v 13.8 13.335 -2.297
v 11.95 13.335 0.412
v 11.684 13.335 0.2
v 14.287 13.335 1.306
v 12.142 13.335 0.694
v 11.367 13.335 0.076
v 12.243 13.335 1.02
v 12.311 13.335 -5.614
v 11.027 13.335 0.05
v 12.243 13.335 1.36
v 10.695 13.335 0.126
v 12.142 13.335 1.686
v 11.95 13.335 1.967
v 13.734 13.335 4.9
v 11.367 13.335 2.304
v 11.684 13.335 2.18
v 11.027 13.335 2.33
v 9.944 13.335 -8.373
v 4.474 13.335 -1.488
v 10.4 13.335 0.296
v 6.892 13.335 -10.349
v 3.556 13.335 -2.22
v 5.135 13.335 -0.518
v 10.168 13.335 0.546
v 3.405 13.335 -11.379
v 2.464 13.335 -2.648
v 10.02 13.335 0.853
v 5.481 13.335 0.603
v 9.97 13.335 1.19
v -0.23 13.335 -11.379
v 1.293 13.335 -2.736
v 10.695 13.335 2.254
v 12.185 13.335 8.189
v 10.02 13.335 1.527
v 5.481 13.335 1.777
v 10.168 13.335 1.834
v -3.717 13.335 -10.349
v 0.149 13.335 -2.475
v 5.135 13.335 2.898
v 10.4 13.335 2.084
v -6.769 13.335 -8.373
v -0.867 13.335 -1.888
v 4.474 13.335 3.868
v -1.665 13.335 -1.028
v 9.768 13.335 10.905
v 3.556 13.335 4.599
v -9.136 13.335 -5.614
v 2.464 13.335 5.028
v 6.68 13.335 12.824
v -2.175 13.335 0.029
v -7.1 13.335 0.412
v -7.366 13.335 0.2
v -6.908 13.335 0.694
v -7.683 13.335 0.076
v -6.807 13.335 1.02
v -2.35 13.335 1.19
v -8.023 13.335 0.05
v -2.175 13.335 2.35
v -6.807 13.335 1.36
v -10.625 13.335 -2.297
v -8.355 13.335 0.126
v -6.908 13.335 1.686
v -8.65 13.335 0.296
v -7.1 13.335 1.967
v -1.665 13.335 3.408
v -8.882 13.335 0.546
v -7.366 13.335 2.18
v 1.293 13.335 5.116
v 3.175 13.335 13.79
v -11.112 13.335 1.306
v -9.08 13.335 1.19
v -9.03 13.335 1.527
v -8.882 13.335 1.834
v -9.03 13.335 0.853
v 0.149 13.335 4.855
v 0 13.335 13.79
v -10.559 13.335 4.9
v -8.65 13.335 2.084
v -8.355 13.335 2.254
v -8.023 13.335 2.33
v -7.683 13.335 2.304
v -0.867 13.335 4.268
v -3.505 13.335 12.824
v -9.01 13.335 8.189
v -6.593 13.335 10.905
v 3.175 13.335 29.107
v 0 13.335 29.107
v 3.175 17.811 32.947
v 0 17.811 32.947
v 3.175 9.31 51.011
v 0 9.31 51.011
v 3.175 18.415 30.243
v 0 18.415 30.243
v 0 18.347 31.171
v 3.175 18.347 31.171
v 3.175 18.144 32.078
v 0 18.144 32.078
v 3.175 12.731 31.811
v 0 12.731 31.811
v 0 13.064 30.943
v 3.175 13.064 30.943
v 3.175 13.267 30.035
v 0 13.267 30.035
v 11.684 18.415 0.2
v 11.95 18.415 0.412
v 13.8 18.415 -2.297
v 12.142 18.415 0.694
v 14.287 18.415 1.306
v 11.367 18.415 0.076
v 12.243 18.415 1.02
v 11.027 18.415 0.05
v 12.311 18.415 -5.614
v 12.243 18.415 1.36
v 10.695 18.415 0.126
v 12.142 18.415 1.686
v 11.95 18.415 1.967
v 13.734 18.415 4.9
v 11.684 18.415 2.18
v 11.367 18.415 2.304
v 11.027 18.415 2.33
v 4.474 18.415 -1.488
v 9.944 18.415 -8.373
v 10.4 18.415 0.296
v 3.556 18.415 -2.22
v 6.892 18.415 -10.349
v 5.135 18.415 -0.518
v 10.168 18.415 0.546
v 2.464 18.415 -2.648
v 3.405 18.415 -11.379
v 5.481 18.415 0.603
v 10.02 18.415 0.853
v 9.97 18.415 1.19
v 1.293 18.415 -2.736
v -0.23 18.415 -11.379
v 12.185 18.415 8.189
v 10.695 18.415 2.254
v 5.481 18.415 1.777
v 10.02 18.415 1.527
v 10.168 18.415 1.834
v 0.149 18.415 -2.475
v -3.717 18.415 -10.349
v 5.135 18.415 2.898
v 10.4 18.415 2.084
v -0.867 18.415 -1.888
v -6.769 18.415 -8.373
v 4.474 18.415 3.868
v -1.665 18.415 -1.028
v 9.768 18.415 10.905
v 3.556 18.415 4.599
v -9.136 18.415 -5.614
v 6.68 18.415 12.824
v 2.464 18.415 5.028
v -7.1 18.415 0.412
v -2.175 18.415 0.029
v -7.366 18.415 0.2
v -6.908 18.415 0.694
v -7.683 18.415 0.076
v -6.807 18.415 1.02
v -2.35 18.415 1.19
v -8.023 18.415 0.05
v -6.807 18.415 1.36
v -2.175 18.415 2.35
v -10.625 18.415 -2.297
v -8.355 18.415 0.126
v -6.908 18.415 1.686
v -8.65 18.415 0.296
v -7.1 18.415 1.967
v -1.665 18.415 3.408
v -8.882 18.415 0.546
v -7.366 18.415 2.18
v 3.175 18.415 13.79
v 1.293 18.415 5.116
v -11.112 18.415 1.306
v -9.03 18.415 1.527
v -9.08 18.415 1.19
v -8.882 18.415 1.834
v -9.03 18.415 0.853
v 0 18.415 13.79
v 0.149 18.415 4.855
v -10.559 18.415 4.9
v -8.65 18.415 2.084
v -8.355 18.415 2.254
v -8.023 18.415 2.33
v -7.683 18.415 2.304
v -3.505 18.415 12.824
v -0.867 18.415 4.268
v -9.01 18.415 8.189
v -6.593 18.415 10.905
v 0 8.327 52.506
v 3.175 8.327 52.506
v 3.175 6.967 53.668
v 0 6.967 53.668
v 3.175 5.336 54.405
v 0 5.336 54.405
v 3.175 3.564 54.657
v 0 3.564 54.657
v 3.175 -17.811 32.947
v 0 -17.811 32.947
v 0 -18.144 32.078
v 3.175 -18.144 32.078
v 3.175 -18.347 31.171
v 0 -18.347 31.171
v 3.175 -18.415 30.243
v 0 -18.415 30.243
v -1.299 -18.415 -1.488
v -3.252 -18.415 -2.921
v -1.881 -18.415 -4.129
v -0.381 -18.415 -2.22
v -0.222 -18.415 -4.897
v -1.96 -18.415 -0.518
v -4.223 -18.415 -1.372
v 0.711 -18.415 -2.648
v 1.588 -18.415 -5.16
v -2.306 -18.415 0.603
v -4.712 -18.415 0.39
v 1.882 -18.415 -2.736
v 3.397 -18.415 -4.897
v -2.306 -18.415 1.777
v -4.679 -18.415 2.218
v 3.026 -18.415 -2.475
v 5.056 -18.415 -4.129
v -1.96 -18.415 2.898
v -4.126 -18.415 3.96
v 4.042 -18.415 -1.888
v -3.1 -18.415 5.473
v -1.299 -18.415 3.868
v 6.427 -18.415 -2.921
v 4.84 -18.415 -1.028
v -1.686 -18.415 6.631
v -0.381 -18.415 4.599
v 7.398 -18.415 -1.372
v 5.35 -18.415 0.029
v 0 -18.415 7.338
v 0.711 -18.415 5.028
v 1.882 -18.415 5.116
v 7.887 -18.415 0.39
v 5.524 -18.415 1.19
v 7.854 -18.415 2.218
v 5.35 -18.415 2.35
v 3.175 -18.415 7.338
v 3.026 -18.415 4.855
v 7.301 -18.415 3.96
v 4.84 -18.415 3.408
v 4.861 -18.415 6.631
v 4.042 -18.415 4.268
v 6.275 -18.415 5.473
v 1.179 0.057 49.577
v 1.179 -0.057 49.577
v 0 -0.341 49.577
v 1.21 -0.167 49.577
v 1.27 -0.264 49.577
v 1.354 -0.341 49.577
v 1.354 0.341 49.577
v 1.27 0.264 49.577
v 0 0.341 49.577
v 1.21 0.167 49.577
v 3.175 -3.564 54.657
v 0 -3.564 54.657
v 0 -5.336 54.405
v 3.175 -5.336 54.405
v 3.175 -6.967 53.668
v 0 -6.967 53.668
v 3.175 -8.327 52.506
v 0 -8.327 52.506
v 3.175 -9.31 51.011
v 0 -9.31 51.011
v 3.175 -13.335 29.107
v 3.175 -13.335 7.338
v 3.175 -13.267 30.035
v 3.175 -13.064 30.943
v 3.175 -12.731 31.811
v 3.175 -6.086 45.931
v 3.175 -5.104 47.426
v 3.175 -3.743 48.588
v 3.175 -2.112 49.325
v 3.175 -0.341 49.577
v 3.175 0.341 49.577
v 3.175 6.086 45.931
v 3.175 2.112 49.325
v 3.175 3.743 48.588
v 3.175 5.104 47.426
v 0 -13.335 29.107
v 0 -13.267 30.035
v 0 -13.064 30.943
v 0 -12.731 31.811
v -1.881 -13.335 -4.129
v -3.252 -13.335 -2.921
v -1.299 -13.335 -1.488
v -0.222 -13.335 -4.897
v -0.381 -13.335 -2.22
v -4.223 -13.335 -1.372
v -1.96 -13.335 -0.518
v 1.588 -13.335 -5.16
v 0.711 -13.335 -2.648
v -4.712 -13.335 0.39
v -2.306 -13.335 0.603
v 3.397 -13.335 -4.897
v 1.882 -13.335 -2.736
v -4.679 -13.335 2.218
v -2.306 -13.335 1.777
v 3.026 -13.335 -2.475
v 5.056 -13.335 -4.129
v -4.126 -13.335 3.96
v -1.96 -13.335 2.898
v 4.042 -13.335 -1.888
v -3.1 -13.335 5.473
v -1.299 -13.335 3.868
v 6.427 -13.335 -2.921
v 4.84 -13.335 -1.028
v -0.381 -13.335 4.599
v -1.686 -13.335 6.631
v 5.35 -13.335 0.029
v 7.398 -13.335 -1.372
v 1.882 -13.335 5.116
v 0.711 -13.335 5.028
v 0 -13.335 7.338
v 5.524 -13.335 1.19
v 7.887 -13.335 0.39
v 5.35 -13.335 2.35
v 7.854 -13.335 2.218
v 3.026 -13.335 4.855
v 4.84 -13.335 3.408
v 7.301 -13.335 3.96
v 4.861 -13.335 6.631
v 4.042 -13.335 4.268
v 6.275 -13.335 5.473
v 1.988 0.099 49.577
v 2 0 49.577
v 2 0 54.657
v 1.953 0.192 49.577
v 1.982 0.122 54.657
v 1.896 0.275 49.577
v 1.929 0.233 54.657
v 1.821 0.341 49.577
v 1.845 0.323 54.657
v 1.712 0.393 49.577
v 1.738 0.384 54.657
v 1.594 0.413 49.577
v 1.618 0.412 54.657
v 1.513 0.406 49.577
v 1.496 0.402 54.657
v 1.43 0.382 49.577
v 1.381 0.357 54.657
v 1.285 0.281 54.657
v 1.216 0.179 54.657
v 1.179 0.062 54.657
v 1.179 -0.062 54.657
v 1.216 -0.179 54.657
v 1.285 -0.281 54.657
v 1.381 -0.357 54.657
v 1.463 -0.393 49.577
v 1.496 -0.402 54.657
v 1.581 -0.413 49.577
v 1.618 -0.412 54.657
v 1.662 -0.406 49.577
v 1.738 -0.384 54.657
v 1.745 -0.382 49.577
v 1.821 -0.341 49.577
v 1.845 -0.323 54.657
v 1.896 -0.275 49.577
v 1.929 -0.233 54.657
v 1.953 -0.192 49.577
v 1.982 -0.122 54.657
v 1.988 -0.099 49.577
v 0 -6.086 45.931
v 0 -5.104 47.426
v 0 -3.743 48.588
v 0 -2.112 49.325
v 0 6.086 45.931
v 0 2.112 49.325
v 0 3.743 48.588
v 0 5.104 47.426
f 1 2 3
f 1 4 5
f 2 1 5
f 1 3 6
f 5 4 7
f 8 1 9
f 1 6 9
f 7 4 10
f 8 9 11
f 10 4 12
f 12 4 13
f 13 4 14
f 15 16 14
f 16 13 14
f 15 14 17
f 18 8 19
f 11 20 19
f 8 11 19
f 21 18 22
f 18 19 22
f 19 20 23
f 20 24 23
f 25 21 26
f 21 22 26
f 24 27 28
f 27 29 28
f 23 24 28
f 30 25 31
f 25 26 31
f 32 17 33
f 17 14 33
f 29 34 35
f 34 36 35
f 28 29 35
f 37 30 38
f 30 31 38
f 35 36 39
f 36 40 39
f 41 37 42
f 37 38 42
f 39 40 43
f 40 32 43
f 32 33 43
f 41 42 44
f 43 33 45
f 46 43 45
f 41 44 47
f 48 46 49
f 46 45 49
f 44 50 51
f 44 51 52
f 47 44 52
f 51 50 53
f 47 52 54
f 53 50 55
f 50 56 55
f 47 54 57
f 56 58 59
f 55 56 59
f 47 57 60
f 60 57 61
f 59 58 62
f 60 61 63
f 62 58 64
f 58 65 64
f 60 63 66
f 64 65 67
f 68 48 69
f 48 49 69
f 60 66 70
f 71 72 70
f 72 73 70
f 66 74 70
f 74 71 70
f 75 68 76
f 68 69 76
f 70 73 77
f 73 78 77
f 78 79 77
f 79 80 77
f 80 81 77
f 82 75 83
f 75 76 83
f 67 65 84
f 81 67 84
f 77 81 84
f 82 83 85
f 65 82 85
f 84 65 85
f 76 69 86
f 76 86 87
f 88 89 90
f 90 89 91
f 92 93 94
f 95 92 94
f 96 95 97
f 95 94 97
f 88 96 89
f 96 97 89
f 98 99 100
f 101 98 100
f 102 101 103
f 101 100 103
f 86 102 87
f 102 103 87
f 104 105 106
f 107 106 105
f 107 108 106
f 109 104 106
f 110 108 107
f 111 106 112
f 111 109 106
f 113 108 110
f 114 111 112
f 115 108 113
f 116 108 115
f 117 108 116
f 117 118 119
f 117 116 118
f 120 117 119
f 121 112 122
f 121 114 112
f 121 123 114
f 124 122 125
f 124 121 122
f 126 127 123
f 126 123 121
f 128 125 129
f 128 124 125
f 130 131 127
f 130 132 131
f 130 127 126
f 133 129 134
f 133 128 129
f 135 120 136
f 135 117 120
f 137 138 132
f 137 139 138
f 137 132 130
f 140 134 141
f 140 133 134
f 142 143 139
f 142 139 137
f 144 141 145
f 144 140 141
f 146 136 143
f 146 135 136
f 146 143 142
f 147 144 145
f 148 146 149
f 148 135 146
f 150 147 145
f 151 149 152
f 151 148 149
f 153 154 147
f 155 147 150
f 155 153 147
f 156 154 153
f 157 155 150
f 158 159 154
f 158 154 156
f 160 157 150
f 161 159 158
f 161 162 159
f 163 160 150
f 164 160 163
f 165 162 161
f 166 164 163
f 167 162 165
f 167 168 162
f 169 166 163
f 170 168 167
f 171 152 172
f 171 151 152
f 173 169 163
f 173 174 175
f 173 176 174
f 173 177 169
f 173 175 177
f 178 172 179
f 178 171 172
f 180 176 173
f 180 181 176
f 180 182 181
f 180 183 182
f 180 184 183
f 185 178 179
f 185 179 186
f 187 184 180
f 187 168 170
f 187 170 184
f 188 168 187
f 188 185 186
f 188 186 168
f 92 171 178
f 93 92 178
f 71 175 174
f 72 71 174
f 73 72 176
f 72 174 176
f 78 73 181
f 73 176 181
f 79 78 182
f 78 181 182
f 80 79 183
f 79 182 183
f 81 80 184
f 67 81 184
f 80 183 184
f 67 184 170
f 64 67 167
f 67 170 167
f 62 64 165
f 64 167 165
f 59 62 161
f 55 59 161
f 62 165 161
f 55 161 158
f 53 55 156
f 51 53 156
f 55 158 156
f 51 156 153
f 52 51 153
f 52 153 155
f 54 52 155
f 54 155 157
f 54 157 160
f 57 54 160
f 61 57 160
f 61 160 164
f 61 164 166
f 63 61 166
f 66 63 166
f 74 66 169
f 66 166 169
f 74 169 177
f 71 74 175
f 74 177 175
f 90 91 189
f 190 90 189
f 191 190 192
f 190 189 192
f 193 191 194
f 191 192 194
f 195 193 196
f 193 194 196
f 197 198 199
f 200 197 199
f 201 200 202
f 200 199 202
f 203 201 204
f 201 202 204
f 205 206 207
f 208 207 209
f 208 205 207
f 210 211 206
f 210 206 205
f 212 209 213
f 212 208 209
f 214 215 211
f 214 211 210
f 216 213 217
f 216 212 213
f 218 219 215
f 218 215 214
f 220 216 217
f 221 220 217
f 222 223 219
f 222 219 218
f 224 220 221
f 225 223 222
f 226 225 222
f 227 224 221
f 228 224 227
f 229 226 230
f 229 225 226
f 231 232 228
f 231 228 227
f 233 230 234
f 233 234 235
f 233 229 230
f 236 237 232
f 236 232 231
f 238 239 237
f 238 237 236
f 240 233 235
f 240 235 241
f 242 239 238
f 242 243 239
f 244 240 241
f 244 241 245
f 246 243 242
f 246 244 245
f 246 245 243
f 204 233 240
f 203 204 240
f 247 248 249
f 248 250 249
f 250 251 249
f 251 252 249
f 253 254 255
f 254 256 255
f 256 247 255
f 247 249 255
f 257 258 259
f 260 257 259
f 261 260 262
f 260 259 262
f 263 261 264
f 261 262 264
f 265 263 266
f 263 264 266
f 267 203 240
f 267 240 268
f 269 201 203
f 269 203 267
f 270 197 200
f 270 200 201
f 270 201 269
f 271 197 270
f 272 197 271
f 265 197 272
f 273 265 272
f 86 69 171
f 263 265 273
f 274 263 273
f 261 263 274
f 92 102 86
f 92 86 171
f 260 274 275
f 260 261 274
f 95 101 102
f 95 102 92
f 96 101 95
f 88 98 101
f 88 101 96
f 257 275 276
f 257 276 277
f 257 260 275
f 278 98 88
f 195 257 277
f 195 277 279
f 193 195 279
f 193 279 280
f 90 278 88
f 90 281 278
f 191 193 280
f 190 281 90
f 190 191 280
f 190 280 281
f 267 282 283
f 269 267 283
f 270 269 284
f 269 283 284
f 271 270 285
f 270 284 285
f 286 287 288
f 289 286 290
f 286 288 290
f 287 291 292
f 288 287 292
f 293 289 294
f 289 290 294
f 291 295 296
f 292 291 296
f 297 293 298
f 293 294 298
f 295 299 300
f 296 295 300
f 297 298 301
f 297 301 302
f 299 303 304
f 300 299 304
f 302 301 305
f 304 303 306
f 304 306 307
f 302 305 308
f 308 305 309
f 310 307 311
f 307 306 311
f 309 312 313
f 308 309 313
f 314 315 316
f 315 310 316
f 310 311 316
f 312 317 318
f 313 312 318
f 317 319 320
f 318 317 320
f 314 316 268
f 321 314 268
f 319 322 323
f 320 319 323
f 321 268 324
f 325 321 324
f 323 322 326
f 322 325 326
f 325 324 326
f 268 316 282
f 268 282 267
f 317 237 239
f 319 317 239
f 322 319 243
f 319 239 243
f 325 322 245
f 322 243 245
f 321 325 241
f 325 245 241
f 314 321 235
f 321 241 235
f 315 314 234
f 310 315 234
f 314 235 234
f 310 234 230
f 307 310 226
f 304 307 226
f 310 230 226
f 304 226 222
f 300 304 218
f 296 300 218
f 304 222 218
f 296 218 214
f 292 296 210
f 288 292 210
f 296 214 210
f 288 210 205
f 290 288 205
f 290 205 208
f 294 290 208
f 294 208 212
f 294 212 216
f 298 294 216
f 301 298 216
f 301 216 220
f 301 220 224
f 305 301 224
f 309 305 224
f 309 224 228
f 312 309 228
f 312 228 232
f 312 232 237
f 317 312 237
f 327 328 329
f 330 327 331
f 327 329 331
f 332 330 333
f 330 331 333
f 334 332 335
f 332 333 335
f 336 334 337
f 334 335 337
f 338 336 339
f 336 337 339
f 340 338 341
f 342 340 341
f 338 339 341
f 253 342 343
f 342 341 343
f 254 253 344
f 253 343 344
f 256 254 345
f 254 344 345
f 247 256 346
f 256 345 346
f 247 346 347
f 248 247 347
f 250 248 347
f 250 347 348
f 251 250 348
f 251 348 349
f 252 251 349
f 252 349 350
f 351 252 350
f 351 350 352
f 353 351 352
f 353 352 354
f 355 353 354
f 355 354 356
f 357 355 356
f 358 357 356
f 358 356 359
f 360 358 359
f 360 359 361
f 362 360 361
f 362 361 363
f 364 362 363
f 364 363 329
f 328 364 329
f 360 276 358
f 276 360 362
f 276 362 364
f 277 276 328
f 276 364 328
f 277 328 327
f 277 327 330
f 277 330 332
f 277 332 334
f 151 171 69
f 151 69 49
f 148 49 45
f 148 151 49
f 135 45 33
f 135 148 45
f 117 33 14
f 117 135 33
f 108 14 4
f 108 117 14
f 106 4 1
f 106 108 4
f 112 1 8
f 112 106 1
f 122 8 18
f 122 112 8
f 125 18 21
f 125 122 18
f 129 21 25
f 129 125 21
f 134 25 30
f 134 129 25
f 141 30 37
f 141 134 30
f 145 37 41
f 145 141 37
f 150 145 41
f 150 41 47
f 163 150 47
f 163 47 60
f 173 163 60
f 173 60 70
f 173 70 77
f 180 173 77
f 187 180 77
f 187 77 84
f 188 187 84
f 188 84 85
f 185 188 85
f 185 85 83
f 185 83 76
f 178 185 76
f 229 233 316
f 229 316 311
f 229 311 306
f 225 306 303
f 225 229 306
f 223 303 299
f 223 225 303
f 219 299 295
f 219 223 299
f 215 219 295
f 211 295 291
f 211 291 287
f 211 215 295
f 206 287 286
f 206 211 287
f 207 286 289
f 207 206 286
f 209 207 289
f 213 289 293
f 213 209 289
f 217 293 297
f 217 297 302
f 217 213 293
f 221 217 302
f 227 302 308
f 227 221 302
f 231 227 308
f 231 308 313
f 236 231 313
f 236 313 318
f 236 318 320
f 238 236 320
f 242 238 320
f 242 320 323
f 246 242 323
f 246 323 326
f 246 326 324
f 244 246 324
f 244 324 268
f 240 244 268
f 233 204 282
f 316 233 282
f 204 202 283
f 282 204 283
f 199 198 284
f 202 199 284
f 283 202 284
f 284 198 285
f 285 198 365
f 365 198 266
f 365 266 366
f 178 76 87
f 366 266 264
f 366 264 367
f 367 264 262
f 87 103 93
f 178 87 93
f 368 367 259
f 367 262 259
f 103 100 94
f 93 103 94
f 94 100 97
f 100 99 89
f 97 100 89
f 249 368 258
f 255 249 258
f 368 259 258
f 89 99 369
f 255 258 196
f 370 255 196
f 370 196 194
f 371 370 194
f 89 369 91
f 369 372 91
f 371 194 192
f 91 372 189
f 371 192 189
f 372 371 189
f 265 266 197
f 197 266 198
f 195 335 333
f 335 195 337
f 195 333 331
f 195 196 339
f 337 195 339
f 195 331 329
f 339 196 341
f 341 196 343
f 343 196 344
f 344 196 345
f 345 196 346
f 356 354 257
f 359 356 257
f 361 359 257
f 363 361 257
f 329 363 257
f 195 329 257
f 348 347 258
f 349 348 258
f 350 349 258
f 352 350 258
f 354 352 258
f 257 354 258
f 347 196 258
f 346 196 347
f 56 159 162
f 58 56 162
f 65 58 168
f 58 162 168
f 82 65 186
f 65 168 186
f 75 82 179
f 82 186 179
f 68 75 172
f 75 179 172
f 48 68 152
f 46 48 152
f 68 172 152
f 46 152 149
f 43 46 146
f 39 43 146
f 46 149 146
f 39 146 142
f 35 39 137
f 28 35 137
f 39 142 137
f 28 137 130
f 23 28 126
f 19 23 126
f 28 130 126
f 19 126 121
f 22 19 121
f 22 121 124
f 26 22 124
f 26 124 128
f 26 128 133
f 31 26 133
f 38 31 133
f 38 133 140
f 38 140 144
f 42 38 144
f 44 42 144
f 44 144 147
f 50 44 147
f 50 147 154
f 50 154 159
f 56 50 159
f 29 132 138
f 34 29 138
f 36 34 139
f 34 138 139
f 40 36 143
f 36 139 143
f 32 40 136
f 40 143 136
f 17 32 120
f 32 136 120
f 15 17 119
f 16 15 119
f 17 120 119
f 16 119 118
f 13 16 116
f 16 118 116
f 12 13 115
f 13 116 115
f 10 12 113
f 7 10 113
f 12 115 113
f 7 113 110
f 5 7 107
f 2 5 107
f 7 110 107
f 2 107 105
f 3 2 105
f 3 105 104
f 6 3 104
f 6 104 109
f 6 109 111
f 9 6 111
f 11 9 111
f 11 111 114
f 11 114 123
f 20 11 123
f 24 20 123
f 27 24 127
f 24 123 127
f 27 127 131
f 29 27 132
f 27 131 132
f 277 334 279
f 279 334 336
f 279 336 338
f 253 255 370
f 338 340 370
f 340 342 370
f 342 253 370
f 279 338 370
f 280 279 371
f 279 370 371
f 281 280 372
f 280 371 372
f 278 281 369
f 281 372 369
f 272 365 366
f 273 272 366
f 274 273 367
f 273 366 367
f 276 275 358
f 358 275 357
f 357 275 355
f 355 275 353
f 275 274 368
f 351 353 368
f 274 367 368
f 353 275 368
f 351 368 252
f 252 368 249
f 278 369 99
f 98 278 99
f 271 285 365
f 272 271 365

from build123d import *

# Parameters (mm, degrees)
F1_DEPTH = 3.175
F2_R     = 6.35
F2_R_2   = 3.937
F3_DEPTH = 5.08
F4_R     = 12.7
F4_R_2   = 1.143
F4_R_3   = 3.937
F5_DEPTH = 5.08
F6_R     = 0.41275
F7_DEPTH = 5.0814106062


with BuildPart() as f1:
    # F0 (on Right) → F1 (new body)
    with BuildSketch(Plane.YZ):
        with BuildLine():
            Line((-18.415, 5.1269156738), (-13.335, 5.1269156738))
            Line((-13.335, 5.1269156738), (-13.335, 29.1074568056))
            ThreePointArc((-13.335, 29.1074568056), (-13.1820577877, 30.4927274565), (-12.7305984957, 31.8112685458))
            Line((-12.7305984957, 31.8112685458), (-6.086145584, 45.930727414))
            ThreePointArc((-6.086145584, 45.930727414), (-3.7429944023, 48.5884315299), (-0.3405470883, 49.5769156738))
            Line((-0.3405470883, 49.5769156738), (0, 49.5769156738))
            Line((0, 49.5769156738), (0.3405470883, 49.5769156738))
            ThreePointArc((0.3405470883, 49.5769156738), (3.7429944023, 48.5884315299), (6.086145584, 45.930727414))
            Line((6.086145584, 45.930727414), (12.7305984957, 31.8112685458))
            ThreePointArc((12.7305984957, 31.8112685458), (13.1820577877, 30.4927274565), (13.335, 29.1074568056))
            Line((13.335, 29.1074568056), (13.335, 5.1269156738))
            Line((13.335, 5.1269156738), (18.415, 5.1269156738))
            Line((18.415, 5.1269156738), (18.415, 30.2430239001))
            ThreePointArc((18.415, 30.2430239001), (18.2620577877, 31.628294551), (17.8105984957, 32.9468356404))
            Line((17.8105984957, 32.9468356404), (9.3099413945, 51.010727414))
            ThreePointArc((9.3099413945, 51.010727414), (6.9667902129, 53.6684315299), (3.5643428989, 54.6569156738))
            Line((3.5643428989, 54.6569156738), (0, 54.6569156738))
            Line((0, 54.6569156738), (-3.5643428989, 54.6569156738))
            ThreePointArc((-3.5643428989, 54.6569156738), (-6.9667902129, 53.6684315299), (-9.3099413945, 51.010727414))
            Line((-9.3099413945, 51.010727414), (-17.8105984957, 32.9468356404))
            ThreePointArc((-17.8105984957, 32.9468356404), (-18.2620577877, 31.628294551), (-18.415, 30.2430239001))
            Line((-18.415, 30.2430239001), (-18.415, 5.1269156738))
        make_face()
    extrude(amount=F1_DEPTH)

    # F2 (on face) → F3 (join, through all)
    with BuildSketch(Plane.XZ.offset(18.415)):
        with Locations((1.5875, 1.1899156738)):
            Circle(F2_R)
        with Locations((1.5875, 1.1899156738)):
            Circle(F2_R_2, mode=Mode.SUBTRACT)
    extrude(amount=-F3_DEPTH)

    # F4 (on face) → F5 (join, through all)
    with BuildSketch(Plane(origin=(0, 18.415, 0), x_dir=(-1, 0, 0), z_dir=(0, 1, 0))):
        with Locations((-1.5875, 1.1899156739)):
            Circle(F4_R)
        with Locations((-11.1125, 1.1899156739)):
            Circle(F4_R_2, mode=Mode.SUBTRACT)
        with Locations((-1.5875, 1.1899156739)):
            Circle(F4_R_3, mode=Mode.SUBTRACT)
        with Locations((7.9375, 1.1899156739)):
            Circle(F4_R_2, mode=Mode.SUBTRACT)
    extrude(amount=-F5_DEPTH)

    # F6 (on face) → F7 (cut, through all)
    with BuildSketch(Plane.XY.offset(54.6569156738)):
        with Locations((1.5875, 0)):
            Circle(F6_R)
    extrude(amount=-F7_DEPTH, mode=Mode.SUBTRACT)


solid = f1.part
